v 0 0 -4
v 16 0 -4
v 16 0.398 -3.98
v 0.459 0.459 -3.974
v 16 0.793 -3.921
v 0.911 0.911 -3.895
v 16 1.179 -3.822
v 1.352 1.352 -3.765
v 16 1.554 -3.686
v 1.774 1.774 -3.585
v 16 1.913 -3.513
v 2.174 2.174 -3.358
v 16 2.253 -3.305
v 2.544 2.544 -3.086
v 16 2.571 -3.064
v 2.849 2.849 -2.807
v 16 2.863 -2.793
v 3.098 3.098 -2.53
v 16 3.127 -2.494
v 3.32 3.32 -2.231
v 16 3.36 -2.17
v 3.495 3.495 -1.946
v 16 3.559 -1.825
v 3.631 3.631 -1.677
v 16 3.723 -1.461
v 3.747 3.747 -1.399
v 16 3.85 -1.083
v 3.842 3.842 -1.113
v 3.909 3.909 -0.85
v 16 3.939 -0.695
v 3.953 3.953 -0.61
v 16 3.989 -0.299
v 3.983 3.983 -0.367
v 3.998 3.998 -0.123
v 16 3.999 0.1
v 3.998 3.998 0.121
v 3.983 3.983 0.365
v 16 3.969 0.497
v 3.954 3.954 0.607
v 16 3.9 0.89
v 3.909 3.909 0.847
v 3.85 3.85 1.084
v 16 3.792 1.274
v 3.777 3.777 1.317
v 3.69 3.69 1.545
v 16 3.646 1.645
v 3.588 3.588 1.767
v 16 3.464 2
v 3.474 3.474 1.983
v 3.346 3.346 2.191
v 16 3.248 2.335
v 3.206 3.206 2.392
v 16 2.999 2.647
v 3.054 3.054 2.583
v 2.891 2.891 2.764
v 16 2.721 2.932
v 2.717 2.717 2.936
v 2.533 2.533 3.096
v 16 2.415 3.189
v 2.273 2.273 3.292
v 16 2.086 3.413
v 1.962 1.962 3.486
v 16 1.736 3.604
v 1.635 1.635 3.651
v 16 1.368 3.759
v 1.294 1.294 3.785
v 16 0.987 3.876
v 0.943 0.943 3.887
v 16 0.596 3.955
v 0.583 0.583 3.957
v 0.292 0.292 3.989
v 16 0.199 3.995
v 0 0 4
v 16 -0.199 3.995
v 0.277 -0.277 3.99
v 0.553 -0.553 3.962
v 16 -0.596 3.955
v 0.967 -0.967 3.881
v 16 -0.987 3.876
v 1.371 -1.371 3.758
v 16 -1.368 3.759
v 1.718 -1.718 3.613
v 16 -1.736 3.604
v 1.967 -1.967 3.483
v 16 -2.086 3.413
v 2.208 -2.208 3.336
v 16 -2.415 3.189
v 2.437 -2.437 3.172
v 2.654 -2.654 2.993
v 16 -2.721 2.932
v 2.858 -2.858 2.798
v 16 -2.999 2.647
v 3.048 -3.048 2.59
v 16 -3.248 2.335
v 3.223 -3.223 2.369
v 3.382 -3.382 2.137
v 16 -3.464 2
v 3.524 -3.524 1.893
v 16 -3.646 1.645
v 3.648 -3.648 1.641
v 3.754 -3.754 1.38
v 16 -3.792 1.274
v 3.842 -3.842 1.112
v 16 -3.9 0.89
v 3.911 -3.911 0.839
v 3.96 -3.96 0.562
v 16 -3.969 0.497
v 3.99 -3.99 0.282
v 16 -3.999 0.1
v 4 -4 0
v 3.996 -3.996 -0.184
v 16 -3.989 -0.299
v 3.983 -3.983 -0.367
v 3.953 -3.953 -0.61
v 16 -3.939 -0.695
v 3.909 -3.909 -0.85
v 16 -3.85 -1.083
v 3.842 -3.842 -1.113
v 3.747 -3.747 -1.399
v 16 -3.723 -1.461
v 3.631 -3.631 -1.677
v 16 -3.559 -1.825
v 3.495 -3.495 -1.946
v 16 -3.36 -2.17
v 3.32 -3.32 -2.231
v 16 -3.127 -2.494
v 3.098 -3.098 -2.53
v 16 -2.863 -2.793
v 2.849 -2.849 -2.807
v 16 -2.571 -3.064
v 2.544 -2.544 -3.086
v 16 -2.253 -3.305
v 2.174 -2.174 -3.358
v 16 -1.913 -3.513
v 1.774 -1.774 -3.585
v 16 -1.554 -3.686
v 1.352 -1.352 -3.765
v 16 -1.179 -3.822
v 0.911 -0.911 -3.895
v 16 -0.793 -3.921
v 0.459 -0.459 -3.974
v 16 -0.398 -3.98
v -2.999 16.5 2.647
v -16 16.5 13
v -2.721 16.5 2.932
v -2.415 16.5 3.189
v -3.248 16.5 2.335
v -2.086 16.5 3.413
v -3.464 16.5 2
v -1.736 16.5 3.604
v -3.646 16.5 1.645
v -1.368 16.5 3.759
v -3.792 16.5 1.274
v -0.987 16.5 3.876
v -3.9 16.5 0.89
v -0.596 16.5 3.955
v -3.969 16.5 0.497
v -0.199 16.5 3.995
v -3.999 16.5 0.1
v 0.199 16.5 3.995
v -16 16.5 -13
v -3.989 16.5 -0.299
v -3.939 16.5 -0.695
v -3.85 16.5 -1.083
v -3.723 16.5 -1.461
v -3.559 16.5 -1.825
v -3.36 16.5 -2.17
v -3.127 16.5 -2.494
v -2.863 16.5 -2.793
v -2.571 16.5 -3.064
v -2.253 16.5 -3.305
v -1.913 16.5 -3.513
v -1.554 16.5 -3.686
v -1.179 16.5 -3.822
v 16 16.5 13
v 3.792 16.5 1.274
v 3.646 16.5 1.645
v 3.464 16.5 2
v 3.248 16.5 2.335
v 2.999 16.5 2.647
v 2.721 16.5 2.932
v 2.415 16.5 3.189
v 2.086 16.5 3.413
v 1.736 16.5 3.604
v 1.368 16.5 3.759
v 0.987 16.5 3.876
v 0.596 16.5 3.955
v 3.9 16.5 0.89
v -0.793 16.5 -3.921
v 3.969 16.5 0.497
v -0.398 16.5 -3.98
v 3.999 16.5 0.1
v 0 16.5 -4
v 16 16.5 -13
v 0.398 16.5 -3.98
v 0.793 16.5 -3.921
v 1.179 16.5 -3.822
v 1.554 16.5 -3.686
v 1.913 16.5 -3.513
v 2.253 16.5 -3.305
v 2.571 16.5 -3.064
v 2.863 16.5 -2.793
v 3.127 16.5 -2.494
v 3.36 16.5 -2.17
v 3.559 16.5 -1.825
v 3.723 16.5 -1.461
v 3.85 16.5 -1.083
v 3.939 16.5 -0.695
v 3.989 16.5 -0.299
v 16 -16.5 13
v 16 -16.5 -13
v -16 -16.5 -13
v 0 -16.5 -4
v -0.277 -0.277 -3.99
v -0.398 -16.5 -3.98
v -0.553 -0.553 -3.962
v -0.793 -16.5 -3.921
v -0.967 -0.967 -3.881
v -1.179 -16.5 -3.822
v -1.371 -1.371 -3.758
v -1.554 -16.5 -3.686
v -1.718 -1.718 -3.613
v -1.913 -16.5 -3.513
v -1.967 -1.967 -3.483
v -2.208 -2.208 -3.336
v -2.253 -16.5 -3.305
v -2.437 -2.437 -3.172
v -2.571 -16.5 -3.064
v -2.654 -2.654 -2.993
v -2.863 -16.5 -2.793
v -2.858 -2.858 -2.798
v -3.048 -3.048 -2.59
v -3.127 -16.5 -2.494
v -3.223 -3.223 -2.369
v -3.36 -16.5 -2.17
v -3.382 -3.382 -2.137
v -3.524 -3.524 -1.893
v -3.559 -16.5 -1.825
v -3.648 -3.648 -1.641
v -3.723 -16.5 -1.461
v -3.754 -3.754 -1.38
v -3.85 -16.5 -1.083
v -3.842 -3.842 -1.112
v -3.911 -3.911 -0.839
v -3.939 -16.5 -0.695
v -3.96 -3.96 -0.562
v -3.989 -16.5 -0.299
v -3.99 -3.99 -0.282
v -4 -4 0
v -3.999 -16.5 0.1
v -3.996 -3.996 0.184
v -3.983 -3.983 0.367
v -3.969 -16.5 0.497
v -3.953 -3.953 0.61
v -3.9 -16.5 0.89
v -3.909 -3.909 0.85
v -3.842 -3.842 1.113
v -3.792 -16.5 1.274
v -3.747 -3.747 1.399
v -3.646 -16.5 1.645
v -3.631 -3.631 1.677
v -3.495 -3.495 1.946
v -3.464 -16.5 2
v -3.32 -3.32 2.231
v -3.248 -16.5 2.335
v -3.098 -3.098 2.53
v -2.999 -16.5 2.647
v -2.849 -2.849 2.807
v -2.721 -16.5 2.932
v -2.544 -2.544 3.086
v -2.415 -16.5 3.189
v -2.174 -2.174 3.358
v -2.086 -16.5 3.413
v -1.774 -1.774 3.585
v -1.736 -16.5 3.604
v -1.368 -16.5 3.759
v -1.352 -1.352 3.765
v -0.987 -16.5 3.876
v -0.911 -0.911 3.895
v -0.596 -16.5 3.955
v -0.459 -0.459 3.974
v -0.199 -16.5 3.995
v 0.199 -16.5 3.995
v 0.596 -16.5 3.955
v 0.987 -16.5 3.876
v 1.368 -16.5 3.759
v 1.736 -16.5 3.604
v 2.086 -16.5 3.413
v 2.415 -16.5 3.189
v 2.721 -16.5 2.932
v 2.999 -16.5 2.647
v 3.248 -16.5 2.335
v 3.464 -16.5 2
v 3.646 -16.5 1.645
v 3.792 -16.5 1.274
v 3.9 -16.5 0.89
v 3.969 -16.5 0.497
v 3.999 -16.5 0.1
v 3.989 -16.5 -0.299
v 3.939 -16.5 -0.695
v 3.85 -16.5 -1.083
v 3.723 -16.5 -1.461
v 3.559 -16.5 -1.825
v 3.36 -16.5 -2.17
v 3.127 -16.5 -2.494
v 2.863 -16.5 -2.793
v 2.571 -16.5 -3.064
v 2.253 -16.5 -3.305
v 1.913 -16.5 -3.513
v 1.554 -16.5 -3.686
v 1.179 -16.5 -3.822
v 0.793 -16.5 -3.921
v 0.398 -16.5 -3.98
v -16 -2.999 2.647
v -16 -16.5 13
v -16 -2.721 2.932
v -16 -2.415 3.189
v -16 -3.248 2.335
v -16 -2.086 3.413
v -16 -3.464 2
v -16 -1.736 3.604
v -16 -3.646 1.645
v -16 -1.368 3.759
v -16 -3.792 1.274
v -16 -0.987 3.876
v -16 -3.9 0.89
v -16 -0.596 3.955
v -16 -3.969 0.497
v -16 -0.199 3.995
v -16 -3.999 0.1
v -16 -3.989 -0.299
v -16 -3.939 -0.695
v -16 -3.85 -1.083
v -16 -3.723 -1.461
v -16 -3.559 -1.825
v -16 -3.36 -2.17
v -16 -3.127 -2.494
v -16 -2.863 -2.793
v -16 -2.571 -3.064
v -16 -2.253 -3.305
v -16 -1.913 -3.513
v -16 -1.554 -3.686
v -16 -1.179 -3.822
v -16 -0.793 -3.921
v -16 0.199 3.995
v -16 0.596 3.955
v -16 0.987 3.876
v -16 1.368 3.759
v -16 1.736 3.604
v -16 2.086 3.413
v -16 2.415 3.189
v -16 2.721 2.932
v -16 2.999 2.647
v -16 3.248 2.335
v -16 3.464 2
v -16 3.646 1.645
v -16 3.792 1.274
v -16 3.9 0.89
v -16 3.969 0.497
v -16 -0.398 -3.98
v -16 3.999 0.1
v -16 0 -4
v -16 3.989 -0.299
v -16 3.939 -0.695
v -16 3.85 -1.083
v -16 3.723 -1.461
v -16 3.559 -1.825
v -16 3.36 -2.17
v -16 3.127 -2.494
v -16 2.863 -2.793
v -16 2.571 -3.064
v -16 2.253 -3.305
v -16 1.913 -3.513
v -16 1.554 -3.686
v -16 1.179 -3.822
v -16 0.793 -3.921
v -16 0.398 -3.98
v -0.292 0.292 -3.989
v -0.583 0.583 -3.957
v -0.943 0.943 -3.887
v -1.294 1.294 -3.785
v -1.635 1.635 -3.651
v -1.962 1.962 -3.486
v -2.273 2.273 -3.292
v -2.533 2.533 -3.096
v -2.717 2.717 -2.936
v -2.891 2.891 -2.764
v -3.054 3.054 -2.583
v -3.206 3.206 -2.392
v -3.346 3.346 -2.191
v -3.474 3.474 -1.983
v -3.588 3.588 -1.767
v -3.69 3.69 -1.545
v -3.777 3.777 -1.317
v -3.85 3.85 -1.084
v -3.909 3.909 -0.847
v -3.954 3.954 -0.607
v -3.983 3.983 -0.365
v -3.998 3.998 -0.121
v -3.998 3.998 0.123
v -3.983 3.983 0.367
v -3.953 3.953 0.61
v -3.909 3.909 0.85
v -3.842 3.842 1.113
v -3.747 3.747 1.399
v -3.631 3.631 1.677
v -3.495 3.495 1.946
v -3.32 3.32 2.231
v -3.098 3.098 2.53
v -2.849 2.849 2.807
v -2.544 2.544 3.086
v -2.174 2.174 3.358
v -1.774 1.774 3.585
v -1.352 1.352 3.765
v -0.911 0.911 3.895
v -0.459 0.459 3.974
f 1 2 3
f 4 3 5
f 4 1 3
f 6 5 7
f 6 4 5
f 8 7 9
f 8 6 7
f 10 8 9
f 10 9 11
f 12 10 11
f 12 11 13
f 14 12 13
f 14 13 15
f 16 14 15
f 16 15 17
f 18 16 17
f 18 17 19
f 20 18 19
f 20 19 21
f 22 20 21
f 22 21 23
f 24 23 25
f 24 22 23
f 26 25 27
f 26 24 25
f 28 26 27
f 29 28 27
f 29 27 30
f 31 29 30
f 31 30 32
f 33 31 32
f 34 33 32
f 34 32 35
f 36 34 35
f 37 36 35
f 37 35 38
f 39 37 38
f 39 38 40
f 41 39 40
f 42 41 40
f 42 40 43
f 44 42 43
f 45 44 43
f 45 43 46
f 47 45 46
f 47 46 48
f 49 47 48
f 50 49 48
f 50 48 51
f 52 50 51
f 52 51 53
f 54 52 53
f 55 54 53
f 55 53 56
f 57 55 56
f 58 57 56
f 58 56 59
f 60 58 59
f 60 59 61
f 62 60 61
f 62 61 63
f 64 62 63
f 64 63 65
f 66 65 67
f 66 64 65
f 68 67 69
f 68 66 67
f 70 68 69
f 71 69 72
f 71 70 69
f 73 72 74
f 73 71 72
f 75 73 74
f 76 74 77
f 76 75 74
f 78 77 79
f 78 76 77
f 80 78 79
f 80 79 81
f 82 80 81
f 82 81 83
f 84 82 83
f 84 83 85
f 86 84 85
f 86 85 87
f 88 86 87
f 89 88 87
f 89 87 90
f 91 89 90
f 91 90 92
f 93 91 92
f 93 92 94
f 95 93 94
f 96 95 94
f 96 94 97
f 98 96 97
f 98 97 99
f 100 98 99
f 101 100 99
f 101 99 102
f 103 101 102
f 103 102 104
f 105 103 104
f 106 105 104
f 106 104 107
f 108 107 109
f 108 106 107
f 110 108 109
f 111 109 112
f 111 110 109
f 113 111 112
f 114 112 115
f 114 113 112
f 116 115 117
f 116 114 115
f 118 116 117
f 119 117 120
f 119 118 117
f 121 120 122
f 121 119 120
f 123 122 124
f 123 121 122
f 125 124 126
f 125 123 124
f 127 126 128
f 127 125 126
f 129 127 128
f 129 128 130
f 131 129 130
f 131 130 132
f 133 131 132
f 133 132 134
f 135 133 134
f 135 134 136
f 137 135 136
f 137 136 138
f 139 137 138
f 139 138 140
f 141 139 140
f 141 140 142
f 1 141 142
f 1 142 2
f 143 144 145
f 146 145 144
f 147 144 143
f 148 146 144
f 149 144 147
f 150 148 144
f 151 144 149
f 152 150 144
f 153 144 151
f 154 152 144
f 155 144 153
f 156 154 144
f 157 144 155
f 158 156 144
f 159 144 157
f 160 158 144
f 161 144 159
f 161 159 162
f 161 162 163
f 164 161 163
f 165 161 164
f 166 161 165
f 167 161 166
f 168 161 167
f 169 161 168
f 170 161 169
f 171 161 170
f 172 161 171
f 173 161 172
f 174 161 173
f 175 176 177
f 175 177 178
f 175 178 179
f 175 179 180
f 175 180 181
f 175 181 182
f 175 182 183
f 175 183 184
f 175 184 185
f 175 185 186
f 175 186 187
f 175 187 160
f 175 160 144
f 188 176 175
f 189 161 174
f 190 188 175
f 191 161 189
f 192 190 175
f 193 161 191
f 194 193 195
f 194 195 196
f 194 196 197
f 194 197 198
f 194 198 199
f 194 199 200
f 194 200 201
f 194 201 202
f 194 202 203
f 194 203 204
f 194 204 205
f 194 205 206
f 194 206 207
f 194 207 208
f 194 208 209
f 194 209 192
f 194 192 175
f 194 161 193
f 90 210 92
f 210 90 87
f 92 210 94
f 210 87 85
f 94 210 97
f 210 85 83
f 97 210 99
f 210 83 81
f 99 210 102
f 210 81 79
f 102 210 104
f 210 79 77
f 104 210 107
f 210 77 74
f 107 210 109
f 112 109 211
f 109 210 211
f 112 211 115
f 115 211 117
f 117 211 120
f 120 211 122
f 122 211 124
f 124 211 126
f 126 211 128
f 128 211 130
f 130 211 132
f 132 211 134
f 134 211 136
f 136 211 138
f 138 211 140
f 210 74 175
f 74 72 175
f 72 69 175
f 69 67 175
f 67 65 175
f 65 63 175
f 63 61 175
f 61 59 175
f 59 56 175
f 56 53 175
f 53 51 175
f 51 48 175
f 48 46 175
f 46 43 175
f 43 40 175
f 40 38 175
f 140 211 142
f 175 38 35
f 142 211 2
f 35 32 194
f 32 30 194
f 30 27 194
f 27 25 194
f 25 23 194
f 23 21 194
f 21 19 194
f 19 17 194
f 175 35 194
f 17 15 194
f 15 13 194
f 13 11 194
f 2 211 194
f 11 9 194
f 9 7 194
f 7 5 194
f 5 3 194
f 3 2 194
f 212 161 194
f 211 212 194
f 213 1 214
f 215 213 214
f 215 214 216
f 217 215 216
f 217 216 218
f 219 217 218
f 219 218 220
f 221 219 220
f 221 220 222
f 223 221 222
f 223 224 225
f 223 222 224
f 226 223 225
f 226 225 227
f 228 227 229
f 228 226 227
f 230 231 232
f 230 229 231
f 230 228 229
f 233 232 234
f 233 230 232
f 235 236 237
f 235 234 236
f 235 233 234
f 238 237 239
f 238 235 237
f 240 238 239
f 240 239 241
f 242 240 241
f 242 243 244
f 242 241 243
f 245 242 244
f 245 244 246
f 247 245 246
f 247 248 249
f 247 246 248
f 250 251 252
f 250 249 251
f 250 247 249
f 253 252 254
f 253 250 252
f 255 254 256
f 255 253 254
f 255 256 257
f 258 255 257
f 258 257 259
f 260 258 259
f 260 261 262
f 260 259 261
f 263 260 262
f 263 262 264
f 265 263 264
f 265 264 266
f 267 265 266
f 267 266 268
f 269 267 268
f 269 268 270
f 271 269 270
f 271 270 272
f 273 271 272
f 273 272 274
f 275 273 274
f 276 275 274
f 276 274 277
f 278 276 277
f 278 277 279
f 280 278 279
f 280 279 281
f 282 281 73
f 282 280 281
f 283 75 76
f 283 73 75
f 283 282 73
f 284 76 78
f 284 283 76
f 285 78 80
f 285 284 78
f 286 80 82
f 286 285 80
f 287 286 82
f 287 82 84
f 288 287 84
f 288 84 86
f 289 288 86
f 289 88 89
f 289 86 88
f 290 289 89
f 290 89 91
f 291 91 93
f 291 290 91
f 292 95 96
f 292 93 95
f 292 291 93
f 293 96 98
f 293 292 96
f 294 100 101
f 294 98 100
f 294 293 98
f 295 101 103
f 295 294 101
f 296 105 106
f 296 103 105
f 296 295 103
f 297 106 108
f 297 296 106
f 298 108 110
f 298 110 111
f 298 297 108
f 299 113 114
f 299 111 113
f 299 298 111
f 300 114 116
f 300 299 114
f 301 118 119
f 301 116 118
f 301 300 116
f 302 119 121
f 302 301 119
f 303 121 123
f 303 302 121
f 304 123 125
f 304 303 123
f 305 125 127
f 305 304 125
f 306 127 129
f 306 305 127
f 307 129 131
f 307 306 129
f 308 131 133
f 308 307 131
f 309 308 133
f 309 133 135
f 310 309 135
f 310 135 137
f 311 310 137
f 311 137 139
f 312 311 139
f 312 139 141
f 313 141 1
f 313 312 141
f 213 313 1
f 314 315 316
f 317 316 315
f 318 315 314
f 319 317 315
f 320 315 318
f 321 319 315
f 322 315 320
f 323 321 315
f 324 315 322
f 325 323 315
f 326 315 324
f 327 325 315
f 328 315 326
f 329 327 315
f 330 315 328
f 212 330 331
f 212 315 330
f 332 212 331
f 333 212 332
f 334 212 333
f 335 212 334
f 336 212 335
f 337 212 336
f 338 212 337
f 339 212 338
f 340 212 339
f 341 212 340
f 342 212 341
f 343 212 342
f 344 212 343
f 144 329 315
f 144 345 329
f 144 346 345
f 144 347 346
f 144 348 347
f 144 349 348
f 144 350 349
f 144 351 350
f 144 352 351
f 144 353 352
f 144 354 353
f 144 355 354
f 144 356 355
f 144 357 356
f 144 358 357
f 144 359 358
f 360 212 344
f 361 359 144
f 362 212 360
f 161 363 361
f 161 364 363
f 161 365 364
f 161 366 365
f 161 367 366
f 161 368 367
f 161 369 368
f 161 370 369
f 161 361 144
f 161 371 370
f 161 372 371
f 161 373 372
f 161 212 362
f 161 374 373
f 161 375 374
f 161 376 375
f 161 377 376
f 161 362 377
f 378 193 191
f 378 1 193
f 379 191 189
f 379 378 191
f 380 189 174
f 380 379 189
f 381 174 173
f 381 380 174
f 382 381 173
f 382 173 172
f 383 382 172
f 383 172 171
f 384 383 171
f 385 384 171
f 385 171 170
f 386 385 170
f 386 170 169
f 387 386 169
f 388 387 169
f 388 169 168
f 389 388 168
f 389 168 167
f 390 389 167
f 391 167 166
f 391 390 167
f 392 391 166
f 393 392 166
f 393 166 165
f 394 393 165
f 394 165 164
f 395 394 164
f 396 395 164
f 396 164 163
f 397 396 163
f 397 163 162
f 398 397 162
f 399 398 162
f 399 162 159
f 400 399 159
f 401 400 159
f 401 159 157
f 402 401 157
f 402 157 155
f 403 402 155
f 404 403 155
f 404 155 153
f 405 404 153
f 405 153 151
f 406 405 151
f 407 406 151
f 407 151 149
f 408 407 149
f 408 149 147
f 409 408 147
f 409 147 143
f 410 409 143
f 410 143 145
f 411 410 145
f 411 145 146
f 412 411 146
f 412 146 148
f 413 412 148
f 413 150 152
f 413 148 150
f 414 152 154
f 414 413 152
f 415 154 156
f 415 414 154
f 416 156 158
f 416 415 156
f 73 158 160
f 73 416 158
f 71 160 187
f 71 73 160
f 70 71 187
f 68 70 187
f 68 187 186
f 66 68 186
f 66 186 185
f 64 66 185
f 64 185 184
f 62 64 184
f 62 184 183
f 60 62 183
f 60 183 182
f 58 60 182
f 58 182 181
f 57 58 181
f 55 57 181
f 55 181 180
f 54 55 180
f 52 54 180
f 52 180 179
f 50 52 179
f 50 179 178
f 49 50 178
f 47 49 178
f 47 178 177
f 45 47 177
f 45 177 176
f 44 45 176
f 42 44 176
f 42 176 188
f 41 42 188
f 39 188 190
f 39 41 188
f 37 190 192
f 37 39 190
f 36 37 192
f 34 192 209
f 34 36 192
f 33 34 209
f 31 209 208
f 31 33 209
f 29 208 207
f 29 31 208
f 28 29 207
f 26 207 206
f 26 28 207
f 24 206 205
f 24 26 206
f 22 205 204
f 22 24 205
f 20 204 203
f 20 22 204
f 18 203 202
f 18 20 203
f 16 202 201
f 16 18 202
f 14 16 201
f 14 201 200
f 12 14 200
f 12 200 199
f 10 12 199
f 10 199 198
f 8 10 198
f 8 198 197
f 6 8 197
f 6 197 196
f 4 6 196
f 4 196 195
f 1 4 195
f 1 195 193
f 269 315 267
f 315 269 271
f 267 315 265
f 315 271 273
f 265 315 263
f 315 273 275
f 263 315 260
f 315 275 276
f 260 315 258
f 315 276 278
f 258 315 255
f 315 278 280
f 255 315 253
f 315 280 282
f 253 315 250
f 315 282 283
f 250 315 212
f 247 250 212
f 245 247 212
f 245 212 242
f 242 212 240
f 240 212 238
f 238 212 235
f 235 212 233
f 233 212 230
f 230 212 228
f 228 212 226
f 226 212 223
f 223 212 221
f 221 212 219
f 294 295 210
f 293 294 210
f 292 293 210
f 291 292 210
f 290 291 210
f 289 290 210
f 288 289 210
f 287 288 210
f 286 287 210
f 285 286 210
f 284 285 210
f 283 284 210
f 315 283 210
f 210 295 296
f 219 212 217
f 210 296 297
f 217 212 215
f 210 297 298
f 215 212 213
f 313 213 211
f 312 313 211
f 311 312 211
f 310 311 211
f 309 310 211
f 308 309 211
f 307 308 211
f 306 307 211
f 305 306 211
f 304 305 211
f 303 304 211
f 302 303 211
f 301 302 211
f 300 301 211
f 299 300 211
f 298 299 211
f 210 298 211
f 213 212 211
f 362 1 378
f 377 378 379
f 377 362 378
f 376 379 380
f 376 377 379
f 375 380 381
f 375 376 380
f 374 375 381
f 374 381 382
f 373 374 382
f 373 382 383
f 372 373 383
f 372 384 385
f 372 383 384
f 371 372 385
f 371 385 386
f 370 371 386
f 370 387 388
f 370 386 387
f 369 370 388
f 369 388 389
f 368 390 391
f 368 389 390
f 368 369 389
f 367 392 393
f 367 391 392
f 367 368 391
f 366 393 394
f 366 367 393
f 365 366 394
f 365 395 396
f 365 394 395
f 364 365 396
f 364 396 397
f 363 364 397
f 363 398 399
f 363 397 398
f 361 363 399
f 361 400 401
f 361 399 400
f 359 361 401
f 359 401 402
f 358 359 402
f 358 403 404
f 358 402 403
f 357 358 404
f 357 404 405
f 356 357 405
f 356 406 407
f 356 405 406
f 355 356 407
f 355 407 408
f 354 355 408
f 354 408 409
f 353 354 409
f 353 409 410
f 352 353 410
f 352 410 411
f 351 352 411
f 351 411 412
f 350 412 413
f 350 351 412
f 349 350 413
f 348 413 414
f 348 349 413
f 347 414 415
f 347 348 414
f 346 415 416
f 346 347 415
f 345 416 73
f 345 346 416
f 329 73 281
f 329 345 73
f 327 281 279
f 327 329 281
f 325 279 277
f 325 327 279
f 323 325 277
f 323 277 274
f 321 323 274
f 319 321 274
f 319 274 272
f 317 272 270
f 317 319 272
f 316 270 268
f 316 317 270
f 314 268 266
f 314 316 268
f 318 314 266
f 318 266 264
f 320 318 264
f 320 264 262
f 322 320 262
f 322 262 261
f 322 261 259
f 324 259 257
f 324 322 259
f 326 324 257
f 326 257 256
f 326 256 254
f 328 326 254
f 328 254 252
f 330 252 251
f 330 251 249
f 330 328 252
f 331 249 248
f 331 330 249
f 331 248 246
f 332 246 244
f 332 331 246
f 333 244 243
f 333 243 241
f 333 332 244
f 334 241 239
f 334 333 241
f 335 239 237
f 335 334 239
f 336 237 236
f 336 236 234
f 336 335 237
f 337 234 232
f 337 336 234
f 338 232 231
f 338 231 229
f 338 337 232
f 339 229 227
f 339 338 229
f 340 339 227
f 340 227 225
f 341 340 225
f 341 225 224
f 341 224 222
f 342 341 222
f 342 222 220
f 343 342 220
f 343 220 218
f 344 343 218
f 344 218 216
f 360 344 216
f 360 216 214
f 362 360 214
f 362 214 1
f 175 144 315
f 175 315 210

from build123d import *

# Parameters (mm, degrees)
SK_BLOCK_W       = 32
SK_BLOCK_H       = 33
BLOCK_DEPTH      = 26
SK_PITCH_BORE_R  = 4
PITCH_BORE_DEPTH = 40
SK_ROLL_BORE_R   = 4
ROLL_BORE_DEPTH  = 40


with BuildPart() as part:
    # SK_Block → Block (new body)
    with BuildSketch(Plane.XY.offset(-13)):
        Rectangle(SK_BLOCK_W, SK_BLOCK_H)
    extrude(amount=BLOCK_DEPTH)

    # SK_Pitch_Bore → Pitch_Bore (cut)
    with BuildSketch(Plane(origin=(0, -20, 0), x_dir=(1, 0, 0), z_dir=(0, 1, 0))):
        Circle(SK_PITCH_BORE_R)
    extrude(amount=PITCH_BORE_DEPTH, mode=Mode.SUBTRACT)

    # SK_Roll_Bore → Roll_Bore (cut)
    with BuildSketch(Plane(origin=(-20, 0, 0), x_dir=(0, 0, -1), z_dir=(1, 0, 0))):
        Circle(SK_ROLL_BORE_R)
    extrude(amount=ROLL_BORE_DEPTH, mode=Mode.SUBTRACT)


solid = part.part
